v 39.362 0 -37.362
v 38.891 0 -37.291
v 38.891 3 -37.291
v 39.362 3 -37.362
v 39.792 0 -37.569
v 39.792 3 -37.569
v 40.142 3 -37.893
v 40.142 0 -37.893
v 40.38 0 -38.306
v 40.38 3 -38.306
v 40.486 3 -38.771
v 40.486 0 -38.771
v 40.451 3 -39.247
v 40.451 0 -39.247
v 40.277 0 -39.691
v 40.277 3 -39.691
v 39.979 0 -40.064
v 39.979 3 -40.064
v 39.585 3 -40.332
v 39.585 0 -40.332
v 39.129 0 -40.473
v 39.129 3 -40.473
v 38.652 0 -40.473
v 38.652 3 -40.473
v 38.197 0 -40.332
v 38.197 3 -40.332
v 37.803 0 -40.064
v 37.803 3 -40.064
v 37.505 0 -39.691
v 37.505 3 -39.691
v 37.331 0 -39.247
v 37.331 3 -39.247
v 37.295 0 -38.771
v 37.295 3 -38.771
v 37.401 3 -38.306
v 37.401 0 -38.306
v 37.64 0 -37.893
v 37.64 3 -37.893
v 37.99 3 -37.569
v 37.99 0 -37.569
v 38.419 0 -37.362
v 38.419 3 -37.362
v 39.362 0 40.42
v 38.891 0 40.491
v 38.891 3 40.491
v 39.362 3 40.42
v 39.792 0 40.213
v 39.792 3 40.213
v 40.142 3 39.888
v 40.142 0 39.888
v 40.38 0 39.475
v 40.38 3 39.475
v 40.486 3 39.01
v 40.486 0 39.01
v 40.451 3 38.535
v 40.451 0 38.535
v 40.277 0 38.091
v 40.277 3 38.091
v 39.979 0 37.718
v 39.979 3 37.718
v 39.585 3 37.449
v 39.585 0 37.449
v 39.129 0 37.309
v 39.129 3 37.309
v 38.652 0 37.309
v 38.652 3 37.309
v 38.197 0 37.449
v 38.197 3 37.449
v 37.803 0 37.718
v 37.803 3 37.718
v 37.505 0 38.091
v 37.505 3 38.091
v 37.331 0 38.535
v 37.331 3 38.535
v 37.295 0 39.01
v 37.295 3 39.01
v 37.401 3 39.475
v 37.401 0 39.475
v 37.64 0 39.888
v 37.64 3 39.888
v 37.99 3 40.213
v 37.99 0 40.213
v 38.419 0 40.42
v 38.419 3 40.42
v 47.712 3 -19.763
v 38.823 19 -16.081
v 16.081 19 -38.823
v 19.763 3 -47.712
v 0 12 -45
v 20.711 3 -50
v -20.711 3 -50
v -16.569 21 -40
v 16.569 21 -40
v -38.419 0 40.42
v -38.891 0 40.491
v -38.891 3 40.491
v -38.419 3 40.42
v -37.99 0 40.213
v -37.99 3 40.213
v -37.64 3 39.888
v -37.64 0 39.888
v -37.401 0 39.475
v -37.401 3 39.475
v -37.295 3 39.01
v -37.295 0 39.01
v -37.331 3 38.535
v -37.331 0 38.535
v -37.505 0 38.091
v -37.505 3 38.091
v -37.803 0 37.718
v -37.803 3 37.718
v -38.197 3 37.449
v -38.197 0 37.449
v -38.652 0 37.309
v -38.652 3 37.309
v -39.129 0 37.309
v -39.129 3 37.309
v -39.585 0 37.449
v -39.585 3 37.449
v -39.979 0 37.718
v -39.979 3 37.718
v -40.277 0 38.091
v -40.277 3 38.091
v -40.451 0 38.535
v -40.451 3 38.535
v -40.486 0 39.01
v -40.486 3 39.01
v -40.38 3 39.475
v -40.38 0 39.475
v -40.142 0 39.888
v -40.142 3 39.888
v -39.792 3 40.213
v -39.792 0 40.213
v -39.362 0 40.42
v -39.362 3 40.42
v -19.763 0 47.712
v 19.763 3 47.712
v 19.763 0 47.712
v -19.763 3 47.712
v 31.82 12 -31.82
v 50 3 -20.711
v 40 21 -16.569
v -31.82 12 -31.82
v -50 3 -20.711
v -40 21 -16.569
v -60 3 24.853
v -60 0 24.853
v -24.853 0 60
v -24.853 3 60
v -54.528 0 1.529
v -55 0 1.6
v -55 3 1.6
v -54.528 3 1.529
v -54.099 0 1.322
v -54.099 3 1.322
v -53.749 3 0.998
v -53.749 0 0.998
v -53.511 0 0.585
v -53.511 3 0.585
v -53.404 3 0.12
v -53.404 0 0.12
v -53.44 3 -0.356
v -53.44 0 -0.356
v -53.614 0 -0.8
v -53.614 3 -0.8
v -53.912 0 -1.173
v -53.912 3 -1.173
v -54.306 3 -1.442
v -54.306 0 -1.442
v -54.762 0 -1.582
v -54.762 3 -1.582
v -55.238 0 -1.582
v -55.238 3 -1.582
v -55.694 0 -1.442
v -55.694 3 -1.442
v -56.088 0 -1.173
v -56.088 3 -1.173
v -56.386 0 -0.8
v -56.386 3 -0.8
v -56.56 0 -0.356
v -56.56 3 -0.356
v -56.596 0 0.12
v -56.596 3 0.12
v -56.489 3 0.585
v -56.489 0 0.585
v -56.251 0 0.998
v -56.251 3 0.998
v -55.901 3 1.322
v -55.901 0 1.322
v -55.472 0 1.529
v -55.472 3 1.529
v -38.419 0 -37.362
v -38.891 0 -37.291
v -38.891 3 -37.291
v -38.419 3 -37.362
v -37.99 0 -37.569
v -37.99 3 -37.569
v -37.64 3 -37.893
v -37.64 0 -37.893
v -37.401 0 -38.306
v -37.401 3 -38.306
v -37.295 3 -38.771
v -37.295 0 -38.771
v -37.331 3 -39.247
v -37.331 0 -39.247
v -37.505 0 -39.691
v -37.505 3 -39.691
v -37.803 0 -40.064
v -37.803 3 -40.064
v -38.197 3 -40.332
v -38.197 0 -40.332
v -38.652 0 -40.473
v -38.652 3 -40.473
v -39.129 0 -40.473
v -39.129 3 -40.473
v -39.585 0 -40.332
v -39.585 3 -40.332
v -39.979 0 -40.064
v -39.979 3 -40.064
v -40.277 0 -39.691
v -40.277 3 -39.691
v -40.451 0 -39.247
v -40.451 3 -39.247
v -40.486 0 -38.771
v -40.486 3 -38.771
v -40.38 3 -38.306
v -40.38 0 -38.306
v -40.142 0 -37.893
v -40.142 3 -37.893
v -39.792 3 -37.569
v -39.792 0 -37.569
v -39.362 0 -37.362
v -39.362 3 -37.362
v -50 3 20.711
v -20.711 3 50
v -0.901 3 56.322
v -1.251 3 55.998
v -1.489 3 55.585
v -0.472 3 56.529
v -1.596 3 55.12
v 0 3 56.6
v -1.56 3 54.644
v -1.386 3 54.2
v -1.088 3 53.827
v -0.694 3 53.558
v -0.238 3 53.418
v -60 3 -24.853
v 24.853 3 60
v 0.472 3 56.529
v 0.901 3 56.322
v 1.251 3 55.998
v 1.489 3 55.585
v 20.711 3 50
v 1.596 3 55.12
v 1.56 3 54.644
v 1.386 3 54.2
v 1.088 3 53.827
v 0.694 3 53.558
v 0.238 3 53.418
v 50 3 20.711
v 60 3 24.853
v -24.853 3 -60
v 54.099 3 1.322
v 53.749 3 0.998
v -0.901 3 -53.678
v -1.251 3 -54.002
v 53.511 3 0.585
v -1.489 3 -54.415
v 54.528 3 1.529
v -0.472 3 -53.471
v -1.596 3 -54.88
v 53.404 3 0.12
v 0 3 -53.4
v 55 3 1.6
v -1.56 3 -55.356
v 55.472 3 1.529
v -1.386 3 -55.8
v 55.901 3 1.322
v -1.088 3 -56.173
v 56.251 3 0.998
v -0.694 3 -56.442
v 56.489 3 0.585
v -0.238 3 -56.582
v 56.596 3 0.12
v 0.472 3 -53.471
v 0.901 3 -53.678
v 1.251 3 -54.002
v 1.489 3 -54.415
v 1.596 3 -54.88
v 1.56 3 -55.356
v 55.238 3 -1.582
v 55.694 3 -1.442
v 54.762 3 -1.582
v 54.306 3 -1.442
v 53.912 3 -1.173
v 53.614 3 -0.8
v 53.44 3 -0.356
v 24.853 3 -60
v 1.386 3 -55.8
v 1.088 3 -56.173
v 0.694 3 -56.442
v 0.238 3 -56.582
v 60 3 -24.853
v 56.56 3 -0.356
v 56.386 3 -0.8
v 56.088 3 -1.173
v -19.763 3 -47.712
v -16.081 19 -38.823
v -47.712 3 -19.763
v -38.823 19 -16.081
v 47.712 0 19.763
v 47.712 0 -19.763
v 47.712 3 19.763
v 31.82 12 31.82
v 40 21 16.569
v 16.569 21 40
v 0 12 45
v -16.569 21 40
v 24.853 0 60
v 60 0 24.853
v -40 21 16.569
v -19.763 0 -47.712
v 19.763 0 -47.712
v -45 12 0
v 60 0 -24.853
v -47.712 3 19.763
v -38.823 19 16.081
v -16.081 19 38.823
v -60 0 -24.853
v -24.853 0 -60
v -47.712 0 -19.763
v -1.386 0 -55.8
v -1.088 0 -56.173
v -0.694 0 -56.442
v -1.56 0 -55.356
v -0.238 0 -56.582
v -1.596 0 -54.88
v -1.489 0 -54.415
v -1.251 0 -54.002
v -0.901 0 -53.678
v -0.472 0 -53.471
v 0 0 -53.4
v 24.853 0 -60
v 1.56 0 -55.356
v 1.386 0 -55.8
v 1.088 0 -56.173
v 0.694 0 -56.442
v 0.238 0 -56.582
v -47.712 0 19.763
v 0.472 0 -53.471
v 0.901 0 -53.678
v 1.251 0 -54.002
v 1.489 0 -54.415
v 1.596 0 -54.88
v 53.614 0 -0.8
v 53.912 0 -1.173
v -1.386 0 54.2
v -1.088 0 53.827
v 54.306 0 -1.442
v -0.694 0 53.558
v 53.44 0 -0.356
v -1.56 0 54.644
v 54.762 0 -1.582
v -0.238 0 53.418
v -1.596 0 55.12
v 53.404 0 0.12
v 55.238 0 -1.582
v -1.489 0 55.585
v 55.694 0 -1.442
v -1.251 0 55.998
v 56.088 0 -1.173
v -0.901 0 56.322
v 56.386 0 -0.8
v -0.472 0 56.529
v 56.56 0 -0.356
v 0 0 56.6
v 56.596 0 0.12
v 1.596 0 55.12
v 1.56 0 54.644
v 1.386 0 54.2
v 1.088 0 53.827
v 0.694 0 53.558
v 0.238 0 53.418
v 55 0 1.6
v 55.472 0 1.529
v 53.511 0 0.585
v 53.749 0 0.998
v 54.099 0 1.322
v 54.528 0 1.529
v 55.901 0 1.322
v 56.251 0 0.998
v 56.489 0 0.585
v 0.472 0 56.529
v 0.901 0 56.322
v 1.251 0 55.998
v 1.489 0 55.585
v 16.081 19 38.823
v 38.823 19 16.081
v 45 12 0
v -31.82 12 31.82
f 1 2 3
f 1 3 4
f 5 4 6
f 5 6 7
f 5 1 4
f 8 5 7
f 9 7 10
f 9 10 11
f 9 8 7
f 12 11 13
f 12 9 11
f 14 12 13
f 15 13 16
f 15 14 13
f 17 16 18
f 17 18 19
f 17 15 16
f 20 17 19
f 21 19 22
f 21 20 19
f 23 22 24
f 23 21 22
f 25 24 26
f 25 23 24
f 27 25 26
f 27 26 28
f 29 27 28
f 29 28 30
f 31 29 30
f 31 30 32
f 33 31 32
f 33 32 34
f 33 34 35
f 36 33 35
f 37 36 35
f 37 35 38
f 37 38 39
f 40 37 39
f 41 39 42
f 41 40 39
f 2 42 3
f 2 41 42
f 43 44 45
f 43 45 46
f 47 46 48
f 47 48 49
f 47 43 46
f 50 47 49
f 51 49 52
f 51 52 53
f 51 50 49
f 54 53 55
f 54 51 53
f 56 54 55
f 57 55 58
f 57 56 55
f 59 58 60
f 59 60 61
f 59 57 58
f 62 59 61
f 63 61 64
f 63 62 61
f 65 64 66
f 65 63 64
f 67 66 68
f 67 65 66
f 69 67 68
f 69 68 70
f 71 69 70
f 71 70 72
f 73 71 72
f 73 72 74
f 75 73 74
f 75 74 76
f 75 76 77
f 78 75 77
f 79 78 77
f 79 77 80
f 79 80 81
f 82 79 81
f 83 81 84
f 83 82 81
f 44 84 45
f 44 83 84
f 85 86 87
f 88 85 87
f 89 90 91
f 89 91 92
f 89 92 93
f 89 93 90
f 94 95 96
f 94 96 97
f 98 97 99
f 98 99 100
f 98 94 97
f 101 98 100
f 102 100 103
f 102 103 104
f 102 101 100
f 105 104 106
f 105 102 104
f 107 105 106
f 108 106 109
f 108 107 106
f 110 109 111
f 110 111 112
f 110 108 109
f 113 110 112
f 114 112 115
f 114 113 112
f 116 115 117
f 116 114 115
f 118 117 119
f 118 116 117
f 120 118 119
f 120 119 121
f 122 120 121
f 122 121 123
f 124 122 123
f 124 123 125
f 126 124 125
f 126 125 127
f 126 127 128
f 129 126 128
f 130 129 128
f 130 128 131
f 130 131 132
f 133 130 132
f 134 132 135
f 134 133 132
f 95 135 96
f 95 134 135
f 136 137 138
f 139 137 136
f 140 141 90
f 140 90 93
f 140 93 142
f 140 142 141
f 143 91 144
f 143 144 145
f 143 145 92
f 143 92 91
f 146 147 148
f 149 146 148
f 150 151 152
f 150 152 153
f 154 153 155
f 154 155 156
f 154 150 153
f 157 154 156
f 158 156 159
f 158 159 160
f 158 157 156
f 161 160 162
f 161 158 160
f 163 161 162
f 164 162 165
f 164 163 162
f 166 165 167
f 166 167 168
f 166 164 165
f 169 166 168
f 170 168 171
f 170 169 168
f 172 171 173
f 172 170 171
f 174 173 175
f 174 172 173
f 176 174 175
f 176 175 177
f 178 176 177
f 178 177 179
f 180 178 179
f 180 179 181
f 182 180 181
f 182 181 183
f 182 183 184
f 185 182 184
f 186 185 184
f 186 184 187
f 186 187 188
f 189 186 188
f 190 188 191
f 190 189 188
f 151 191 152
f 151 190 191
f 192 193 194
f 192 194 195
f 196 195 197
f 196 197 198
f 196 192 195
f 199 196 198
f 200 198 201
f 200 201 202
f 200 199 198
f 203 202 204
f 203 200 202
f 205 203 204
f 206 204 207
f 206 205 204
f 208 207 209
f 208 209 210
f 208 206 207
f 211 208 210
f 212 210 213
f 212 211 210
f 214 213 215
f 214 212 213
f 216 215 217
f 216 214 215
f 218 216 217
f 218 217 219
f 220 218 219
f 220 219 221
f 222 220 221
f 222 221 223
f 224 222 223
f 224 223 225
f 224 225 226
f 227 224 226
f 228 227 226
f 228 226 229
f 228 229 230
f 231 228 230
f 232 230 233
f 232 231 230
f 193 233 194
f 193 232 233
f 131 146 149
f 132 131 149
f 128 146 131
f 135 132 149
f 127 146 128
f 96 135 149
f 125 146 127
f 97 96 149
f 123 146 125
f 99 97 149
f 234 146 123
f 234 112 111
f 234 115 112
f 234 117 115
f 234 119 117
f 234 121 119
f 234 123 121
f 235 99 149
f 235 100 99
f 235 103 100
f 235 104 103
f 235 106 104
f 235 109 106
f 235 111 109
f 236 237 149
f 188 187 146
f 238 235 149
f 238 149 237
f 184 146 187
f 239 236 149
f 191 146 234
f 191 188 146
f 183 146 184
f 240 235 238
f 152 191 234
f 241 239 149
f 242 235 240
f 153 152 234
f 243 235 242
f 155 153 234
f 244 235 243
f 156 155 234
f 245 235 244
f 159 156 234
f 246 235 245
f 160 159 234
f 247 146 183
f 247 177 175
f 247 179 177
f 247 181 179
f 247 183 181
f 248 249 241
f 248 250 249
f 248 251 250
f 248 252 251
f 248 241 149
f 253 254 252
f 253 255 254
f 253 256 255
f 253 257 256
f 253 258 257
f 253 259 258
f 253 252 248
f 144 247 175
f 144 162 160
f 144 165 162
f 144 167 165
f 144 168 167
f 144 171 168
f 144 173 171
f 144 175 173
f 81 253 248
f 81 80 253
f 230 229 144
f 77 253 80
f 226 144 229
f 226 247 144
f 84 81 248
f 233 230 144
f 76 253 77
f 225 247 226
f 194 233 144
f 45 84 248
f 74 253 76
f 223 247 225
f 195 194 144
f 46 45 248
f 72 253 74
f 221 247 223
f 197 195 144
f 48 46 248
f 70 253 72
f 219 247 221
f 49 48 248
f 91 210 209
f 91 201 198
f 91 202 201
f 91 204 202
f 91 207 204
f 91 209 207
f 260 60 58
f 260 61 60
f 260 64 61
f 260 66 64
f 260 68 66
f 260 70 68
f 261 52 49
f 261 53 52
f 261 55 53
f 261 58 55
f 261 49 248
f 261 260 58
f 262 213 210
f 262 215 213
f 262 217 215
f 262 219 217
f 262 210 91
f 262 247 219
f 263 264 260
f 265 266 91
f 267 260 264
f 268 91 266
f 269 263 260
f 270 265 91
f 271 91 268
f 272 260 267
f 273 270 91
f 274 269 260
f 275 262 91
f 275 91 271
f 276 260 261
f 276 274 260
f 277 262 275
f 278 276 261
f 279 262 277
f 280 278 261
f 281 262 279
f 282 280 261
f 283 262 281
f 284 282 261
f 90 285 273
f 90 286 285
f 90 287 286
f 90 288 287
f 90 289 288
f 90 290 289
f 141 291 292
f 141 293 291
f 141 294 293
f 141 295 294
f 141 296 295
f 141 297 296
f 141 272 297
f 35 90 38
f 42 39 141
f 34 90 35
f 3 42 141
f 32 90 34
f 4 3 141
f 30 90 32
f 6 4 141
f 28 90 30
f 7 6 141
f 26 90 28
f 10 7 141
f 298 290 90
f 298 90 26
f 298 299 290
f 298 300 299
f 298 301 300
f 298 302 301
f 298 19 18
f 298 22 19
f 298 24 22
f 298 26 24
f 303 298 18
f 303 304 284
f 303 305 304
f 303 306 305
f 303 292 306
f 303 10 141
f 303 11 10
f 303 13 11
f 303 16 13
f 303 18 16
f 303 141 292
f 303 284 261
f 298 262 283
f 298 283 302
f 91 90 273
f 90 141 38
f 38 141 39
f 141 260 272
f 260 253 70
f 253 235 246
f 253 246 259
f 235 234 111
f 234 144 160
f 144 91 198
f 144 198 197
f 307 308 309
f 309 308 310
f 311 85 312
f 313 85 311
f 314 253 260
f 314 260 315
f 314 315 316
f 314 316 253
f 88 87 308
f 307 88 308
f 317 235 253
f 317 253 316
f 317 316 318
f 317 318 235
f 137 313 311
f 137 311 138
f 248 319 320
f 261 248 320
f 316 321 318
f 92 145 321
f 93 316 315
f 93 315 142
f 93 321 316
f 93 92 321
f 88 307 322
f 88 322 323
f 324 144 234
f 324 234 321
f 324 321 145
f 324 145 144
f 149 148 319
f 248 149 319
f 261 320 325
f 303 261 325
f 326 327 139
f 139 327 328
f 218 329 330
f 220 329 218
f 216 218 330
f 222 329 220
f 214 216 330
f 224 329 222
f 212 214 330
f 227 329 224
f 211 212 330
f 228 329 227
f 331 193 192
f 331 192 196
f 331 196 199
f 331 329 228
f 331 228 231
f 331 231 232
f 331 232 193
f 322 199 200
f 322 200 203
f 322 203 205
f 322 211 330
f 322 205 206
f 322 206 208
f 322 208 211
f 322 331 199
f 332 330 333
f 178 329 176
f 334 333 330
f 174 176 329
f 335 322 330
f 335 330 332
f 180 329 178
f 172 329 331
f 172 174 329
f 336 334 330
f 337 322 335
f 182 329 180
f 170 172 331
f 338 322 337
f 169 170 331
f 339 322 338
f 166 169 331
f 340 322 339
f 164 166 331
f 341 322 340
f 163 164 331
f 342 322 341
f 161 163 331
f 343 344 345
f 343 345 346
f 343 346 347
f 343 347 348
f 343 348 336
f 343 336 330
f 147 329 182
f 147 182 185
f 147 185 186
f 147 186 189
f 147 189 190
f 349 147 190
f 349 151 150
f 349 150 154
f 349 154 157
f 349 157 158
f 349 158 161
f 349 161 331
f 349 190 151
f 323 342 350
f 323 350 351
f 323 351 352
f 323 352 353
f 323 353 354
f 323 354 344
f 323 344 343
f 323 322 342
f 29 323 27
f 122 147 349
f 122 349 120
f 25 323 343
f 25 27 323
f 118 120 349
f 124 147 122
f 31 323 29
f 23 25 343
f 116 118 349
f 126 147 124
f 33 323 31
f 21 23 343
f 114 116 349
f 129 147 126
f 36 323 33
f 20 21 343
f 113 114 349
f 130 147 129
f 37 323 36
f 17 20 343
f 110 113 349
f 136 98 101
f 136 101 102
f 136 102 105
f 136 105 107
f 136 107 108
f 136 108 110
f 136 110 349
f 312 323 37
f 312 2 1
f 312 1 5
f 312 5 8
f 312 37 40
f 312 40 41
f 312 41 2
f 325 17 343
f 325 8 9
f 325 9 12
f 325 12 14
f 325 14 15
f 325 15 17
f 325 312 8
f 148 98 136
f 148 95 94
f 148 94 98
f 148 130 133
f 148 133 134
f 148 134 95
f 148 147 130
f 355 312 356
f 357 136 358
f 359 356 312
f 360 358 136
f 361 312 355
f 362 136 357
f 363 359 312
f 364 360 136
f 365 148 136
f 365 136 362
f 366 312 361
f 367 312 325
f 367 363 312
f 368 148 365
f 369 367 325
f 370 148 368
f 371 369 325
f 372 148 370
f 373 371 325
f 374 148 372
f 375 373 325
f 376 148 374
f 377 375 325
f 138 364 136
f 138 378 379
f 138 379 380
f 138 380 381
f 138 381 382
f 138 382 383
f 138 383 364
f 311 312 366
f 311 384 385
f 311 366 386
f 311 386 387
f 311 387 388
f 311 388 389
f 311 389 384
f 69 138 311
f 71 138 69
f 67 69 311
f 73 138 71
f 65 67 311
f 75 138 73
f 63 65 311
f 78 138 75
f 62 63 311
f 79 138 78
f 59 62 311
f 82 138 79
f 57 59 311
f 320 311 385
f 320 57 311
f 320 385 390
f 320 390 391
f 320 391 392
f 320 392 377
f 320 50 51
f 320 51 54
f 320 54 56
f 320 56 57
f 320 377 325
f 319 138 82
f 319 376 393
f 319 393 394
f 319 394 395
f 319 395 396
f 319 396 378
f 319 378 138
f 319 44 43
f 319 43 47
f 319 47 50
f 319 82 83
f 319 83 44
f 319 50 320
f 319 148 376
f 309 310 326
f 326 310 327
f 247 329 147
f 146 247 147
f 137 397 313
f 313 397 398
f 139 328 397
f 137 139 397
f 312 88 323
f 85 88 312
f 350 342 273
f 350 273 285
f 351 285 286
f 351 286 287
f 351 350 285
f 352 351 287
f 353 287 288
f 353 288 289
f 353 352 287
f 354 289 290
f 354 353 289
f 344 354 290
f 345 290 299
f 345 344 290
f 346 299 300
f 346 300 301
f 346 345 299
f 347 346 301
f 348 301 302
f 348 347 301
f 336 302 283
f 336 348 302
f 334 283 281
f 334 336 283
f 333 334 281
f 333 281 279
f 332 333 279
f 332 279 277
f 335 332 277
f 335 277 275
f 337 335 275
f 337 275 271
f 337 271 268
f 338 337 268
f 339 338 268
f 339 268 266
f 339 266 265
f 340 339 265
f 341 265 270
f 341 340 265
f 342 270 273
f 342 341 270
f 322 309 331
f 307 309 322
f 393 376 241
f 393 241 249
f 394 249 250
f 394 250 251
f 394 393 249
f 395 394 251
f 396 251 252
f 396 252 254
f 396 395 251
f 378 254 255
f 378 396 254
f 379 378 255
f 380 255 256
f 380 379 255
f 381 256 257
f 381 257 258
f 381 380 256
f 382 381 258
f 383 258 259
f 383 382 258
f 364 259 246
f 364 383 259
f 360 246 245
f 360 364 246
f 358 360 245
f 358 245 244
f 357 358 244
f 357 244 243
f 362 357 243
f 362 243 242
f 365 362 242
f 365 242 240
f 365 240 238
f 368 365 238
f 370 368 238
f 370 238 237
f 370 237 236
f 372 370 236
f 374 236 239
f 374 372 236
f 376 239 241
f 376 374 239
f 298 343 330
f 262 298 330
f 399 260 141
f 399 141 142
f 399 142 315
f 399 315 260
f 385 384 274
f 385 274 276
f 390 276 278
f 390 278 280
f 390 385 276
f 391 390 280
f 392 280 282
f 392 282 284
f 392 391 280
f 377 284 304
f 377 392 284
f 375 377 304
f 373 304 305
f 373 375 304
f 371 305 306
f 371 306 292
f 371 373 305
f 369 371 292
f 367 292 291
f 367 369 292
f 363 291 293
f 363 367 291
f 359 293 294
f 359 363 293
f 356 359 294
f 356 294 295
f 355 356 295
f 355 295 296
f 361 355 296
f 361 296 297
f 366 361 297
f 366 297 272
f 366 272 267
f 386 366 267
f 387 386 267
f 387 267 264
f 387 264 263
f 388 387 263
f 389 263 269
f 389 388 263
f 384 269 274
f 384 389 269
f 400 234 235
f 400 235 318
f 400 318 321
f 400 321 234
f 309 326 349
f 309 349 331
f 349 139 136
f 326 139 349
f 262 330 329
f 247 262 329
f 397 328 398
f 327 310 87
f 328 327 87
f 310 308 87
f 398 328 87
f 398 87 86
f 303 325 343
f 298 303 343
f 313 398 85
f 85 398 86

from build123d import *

# Parameters (mm, degrees)
SKETCH2_R           = 1.6
BOSS_EXTRUDE1_DEPTH = 3
CUT_EXTRUDE1_DEPTH  = 85.905830189
BOSS_EXTRUDE2_DEPTH = 3
SHELL1_T            = -2
BOSS_EXTRUDE4_DEPTH = 3


with BuildPart() as part:
    # Sketch2 → Boss-Extrude1 (new body)
    with BuildSketch(Plane(origin=(0, 0, 0), x_dir=(1, 0, 0), z_dir=(0, 1, 0))):
        Polygon((-24.852813742, 60), (-60, 24.852813742), (-60, -24.852813742), (-24.852813742, -60), (24.852813742, -60), (60, -24.852813742), (60, 24.852813742), (24.852813742, 60), align=None)
        with Locations(Location((-38.890872965, -38.890872965, 0), (0, 0, 270))):
            Circle(SKETCH2_R, mode=Mode.SUBTRACT)
        with Locations(Location((38.890872965, 38.890872965, 0), (0, 0, 270))):
            Circle(SKETCH2_R, mode=Mode.SUBTRACT)
        with Locations(Location((0, -55, 0), (0, 0, 270))):
            Circle(SKETCH2_R, mode=Mode.SUBTRACT)
        with Locations(Location((0, 55, 0), (0, 0, 270))):
            Circle(SKETCH2_R, mode=Mode.SUBTRACT)
        with Locations(Location((38.890872965, -38.890872965, 0), (0, 0, 270))):
            Circle(SKETCH2_R, mode=Mode.SUBTRACT)
        with Locations(Location((-38.890872965, 38.890872965, 0), (0, 0, 270))):
            Circle(SKETCH2_R, mode=Mode.SUBTRACT)
        with Locations(Location((55, 0, 0), (0, 0, 270))):
            Circle(SKETCH2_R, mode=Mode.SUBTRACT)
        with Locations(Location((-55, 0, 0), (0, 0, 270))):
            Circle(SKETCH2_R, mode=Mode.SUBTRACT)
    extrude(amount=BOSS_EXTRUDE1_DEPTH)

    # Sketch3 → Cut-Extrude1 (cut, through all)
    with BuildSketch(Plane(origin=(0, 3, 0), x_dir=(1, 0, 0), z_dir=(0, 1, 0))):
        Polygon((20.710678119, 50), (-20.710678119, 50), (-50, 20.710678119), (-50, -20.710678119), (-20.710678119, -50), (20.710678119, -50), (50, -20.710678119), (50, 20.710678119), align=None)
    extrude(amount=-CUT_EXTRUDE1_DEPTH, mode=Mode.SUBTRACT)



with BuildPart() as body_2:
    # Sketch4 → Boss-Extrude2 (new body)
    with BuildSketch(Plane(origin=(0, 18, 0), x_dir=(1, 0, 0), z_dir=(0, 1, 0))):
        Polygon((-40, 16.568542495), (-40, -16.568542495), (-16.568542495, -40), (16.568542495, -40), (40, -16.568542495), (40, 16.568542495), (16.568542495, 40), (-16.568542495, 40), align=None)
    extrude(amount=BOSS_EXTRUDE2_DEPTH)

    # Sketch3<3> → section 0 of loft1
    with BuildSketch(Plane(origin=(0, 3, 0), x_dir=(1, 0, 0), z_dir=(0, 1, 0)), mode=Mode.PRIVATE) as loft1_s0:
        with BuildLine():
            Line((-50, 20.710678119), (-50, -20.710678119))
            Line((-50, -20.710678119), (-20.710678119, -50))
            Line((-20.710678119, -50), (20.710678119, -50))
            Line((20.710678119, -50), (50, -20.710678119))
            Line((50, -20.710678119), (50, 20.710678119))
            Line((50, 20.710678119), (20.710678119, 50))
            Line((20.710678119, 50), (-20.710678119, 50))
            Line((-20.710678119, 50), (-50, 20.710678119))
        make_face()
    # loft up to a face of the part (loft1)
    loft([loft1_s0.sketch, body_2.faces().sort_by_distance((0, 21, 0))[0]])

    # Shell1
    shell1_openings = [body_2.faces().sort_by_distance(p)[0] for p in [
        (0, 3, 0),
    ]]
    offset(amount=SHELL1_T, openings=shell1_openings, kind=Kind.INTERSECTION)


with BuildPart() as part_1:
    add(part.part)

    add(body_2.part)  # Boss-Extrude4 merges body 2
    # Sketch5 → Boss-Extrude4 (add)
    with BuildSketch(Plane.XZ.offset(-3)):
        Polygon((-50, 20.710678119), (-50, -20.710678119), (-20.710678119, -50), (20.710678119, -50), (50, -20.710678119), (50, 20.710678119), (20.710678119, 50), (-20.710678119, 50), align=None)
        Polygon((-47.712082191, 19.762991533), (-47.712082191, -19.762991533), (-19.762991533, -47.712082191), (19.762991533, -47.712082191), (47.712082191, -19.762991533), (47.712082191, 19.762991533), (19.762991533, 47.712082191), (-19.762991533, 47.712082191), align=None, mode=Mode.SUBTRACT)
    extrude(amount=BOSS_EXTRUDE4_DEPTH)


solid = part_1.part
